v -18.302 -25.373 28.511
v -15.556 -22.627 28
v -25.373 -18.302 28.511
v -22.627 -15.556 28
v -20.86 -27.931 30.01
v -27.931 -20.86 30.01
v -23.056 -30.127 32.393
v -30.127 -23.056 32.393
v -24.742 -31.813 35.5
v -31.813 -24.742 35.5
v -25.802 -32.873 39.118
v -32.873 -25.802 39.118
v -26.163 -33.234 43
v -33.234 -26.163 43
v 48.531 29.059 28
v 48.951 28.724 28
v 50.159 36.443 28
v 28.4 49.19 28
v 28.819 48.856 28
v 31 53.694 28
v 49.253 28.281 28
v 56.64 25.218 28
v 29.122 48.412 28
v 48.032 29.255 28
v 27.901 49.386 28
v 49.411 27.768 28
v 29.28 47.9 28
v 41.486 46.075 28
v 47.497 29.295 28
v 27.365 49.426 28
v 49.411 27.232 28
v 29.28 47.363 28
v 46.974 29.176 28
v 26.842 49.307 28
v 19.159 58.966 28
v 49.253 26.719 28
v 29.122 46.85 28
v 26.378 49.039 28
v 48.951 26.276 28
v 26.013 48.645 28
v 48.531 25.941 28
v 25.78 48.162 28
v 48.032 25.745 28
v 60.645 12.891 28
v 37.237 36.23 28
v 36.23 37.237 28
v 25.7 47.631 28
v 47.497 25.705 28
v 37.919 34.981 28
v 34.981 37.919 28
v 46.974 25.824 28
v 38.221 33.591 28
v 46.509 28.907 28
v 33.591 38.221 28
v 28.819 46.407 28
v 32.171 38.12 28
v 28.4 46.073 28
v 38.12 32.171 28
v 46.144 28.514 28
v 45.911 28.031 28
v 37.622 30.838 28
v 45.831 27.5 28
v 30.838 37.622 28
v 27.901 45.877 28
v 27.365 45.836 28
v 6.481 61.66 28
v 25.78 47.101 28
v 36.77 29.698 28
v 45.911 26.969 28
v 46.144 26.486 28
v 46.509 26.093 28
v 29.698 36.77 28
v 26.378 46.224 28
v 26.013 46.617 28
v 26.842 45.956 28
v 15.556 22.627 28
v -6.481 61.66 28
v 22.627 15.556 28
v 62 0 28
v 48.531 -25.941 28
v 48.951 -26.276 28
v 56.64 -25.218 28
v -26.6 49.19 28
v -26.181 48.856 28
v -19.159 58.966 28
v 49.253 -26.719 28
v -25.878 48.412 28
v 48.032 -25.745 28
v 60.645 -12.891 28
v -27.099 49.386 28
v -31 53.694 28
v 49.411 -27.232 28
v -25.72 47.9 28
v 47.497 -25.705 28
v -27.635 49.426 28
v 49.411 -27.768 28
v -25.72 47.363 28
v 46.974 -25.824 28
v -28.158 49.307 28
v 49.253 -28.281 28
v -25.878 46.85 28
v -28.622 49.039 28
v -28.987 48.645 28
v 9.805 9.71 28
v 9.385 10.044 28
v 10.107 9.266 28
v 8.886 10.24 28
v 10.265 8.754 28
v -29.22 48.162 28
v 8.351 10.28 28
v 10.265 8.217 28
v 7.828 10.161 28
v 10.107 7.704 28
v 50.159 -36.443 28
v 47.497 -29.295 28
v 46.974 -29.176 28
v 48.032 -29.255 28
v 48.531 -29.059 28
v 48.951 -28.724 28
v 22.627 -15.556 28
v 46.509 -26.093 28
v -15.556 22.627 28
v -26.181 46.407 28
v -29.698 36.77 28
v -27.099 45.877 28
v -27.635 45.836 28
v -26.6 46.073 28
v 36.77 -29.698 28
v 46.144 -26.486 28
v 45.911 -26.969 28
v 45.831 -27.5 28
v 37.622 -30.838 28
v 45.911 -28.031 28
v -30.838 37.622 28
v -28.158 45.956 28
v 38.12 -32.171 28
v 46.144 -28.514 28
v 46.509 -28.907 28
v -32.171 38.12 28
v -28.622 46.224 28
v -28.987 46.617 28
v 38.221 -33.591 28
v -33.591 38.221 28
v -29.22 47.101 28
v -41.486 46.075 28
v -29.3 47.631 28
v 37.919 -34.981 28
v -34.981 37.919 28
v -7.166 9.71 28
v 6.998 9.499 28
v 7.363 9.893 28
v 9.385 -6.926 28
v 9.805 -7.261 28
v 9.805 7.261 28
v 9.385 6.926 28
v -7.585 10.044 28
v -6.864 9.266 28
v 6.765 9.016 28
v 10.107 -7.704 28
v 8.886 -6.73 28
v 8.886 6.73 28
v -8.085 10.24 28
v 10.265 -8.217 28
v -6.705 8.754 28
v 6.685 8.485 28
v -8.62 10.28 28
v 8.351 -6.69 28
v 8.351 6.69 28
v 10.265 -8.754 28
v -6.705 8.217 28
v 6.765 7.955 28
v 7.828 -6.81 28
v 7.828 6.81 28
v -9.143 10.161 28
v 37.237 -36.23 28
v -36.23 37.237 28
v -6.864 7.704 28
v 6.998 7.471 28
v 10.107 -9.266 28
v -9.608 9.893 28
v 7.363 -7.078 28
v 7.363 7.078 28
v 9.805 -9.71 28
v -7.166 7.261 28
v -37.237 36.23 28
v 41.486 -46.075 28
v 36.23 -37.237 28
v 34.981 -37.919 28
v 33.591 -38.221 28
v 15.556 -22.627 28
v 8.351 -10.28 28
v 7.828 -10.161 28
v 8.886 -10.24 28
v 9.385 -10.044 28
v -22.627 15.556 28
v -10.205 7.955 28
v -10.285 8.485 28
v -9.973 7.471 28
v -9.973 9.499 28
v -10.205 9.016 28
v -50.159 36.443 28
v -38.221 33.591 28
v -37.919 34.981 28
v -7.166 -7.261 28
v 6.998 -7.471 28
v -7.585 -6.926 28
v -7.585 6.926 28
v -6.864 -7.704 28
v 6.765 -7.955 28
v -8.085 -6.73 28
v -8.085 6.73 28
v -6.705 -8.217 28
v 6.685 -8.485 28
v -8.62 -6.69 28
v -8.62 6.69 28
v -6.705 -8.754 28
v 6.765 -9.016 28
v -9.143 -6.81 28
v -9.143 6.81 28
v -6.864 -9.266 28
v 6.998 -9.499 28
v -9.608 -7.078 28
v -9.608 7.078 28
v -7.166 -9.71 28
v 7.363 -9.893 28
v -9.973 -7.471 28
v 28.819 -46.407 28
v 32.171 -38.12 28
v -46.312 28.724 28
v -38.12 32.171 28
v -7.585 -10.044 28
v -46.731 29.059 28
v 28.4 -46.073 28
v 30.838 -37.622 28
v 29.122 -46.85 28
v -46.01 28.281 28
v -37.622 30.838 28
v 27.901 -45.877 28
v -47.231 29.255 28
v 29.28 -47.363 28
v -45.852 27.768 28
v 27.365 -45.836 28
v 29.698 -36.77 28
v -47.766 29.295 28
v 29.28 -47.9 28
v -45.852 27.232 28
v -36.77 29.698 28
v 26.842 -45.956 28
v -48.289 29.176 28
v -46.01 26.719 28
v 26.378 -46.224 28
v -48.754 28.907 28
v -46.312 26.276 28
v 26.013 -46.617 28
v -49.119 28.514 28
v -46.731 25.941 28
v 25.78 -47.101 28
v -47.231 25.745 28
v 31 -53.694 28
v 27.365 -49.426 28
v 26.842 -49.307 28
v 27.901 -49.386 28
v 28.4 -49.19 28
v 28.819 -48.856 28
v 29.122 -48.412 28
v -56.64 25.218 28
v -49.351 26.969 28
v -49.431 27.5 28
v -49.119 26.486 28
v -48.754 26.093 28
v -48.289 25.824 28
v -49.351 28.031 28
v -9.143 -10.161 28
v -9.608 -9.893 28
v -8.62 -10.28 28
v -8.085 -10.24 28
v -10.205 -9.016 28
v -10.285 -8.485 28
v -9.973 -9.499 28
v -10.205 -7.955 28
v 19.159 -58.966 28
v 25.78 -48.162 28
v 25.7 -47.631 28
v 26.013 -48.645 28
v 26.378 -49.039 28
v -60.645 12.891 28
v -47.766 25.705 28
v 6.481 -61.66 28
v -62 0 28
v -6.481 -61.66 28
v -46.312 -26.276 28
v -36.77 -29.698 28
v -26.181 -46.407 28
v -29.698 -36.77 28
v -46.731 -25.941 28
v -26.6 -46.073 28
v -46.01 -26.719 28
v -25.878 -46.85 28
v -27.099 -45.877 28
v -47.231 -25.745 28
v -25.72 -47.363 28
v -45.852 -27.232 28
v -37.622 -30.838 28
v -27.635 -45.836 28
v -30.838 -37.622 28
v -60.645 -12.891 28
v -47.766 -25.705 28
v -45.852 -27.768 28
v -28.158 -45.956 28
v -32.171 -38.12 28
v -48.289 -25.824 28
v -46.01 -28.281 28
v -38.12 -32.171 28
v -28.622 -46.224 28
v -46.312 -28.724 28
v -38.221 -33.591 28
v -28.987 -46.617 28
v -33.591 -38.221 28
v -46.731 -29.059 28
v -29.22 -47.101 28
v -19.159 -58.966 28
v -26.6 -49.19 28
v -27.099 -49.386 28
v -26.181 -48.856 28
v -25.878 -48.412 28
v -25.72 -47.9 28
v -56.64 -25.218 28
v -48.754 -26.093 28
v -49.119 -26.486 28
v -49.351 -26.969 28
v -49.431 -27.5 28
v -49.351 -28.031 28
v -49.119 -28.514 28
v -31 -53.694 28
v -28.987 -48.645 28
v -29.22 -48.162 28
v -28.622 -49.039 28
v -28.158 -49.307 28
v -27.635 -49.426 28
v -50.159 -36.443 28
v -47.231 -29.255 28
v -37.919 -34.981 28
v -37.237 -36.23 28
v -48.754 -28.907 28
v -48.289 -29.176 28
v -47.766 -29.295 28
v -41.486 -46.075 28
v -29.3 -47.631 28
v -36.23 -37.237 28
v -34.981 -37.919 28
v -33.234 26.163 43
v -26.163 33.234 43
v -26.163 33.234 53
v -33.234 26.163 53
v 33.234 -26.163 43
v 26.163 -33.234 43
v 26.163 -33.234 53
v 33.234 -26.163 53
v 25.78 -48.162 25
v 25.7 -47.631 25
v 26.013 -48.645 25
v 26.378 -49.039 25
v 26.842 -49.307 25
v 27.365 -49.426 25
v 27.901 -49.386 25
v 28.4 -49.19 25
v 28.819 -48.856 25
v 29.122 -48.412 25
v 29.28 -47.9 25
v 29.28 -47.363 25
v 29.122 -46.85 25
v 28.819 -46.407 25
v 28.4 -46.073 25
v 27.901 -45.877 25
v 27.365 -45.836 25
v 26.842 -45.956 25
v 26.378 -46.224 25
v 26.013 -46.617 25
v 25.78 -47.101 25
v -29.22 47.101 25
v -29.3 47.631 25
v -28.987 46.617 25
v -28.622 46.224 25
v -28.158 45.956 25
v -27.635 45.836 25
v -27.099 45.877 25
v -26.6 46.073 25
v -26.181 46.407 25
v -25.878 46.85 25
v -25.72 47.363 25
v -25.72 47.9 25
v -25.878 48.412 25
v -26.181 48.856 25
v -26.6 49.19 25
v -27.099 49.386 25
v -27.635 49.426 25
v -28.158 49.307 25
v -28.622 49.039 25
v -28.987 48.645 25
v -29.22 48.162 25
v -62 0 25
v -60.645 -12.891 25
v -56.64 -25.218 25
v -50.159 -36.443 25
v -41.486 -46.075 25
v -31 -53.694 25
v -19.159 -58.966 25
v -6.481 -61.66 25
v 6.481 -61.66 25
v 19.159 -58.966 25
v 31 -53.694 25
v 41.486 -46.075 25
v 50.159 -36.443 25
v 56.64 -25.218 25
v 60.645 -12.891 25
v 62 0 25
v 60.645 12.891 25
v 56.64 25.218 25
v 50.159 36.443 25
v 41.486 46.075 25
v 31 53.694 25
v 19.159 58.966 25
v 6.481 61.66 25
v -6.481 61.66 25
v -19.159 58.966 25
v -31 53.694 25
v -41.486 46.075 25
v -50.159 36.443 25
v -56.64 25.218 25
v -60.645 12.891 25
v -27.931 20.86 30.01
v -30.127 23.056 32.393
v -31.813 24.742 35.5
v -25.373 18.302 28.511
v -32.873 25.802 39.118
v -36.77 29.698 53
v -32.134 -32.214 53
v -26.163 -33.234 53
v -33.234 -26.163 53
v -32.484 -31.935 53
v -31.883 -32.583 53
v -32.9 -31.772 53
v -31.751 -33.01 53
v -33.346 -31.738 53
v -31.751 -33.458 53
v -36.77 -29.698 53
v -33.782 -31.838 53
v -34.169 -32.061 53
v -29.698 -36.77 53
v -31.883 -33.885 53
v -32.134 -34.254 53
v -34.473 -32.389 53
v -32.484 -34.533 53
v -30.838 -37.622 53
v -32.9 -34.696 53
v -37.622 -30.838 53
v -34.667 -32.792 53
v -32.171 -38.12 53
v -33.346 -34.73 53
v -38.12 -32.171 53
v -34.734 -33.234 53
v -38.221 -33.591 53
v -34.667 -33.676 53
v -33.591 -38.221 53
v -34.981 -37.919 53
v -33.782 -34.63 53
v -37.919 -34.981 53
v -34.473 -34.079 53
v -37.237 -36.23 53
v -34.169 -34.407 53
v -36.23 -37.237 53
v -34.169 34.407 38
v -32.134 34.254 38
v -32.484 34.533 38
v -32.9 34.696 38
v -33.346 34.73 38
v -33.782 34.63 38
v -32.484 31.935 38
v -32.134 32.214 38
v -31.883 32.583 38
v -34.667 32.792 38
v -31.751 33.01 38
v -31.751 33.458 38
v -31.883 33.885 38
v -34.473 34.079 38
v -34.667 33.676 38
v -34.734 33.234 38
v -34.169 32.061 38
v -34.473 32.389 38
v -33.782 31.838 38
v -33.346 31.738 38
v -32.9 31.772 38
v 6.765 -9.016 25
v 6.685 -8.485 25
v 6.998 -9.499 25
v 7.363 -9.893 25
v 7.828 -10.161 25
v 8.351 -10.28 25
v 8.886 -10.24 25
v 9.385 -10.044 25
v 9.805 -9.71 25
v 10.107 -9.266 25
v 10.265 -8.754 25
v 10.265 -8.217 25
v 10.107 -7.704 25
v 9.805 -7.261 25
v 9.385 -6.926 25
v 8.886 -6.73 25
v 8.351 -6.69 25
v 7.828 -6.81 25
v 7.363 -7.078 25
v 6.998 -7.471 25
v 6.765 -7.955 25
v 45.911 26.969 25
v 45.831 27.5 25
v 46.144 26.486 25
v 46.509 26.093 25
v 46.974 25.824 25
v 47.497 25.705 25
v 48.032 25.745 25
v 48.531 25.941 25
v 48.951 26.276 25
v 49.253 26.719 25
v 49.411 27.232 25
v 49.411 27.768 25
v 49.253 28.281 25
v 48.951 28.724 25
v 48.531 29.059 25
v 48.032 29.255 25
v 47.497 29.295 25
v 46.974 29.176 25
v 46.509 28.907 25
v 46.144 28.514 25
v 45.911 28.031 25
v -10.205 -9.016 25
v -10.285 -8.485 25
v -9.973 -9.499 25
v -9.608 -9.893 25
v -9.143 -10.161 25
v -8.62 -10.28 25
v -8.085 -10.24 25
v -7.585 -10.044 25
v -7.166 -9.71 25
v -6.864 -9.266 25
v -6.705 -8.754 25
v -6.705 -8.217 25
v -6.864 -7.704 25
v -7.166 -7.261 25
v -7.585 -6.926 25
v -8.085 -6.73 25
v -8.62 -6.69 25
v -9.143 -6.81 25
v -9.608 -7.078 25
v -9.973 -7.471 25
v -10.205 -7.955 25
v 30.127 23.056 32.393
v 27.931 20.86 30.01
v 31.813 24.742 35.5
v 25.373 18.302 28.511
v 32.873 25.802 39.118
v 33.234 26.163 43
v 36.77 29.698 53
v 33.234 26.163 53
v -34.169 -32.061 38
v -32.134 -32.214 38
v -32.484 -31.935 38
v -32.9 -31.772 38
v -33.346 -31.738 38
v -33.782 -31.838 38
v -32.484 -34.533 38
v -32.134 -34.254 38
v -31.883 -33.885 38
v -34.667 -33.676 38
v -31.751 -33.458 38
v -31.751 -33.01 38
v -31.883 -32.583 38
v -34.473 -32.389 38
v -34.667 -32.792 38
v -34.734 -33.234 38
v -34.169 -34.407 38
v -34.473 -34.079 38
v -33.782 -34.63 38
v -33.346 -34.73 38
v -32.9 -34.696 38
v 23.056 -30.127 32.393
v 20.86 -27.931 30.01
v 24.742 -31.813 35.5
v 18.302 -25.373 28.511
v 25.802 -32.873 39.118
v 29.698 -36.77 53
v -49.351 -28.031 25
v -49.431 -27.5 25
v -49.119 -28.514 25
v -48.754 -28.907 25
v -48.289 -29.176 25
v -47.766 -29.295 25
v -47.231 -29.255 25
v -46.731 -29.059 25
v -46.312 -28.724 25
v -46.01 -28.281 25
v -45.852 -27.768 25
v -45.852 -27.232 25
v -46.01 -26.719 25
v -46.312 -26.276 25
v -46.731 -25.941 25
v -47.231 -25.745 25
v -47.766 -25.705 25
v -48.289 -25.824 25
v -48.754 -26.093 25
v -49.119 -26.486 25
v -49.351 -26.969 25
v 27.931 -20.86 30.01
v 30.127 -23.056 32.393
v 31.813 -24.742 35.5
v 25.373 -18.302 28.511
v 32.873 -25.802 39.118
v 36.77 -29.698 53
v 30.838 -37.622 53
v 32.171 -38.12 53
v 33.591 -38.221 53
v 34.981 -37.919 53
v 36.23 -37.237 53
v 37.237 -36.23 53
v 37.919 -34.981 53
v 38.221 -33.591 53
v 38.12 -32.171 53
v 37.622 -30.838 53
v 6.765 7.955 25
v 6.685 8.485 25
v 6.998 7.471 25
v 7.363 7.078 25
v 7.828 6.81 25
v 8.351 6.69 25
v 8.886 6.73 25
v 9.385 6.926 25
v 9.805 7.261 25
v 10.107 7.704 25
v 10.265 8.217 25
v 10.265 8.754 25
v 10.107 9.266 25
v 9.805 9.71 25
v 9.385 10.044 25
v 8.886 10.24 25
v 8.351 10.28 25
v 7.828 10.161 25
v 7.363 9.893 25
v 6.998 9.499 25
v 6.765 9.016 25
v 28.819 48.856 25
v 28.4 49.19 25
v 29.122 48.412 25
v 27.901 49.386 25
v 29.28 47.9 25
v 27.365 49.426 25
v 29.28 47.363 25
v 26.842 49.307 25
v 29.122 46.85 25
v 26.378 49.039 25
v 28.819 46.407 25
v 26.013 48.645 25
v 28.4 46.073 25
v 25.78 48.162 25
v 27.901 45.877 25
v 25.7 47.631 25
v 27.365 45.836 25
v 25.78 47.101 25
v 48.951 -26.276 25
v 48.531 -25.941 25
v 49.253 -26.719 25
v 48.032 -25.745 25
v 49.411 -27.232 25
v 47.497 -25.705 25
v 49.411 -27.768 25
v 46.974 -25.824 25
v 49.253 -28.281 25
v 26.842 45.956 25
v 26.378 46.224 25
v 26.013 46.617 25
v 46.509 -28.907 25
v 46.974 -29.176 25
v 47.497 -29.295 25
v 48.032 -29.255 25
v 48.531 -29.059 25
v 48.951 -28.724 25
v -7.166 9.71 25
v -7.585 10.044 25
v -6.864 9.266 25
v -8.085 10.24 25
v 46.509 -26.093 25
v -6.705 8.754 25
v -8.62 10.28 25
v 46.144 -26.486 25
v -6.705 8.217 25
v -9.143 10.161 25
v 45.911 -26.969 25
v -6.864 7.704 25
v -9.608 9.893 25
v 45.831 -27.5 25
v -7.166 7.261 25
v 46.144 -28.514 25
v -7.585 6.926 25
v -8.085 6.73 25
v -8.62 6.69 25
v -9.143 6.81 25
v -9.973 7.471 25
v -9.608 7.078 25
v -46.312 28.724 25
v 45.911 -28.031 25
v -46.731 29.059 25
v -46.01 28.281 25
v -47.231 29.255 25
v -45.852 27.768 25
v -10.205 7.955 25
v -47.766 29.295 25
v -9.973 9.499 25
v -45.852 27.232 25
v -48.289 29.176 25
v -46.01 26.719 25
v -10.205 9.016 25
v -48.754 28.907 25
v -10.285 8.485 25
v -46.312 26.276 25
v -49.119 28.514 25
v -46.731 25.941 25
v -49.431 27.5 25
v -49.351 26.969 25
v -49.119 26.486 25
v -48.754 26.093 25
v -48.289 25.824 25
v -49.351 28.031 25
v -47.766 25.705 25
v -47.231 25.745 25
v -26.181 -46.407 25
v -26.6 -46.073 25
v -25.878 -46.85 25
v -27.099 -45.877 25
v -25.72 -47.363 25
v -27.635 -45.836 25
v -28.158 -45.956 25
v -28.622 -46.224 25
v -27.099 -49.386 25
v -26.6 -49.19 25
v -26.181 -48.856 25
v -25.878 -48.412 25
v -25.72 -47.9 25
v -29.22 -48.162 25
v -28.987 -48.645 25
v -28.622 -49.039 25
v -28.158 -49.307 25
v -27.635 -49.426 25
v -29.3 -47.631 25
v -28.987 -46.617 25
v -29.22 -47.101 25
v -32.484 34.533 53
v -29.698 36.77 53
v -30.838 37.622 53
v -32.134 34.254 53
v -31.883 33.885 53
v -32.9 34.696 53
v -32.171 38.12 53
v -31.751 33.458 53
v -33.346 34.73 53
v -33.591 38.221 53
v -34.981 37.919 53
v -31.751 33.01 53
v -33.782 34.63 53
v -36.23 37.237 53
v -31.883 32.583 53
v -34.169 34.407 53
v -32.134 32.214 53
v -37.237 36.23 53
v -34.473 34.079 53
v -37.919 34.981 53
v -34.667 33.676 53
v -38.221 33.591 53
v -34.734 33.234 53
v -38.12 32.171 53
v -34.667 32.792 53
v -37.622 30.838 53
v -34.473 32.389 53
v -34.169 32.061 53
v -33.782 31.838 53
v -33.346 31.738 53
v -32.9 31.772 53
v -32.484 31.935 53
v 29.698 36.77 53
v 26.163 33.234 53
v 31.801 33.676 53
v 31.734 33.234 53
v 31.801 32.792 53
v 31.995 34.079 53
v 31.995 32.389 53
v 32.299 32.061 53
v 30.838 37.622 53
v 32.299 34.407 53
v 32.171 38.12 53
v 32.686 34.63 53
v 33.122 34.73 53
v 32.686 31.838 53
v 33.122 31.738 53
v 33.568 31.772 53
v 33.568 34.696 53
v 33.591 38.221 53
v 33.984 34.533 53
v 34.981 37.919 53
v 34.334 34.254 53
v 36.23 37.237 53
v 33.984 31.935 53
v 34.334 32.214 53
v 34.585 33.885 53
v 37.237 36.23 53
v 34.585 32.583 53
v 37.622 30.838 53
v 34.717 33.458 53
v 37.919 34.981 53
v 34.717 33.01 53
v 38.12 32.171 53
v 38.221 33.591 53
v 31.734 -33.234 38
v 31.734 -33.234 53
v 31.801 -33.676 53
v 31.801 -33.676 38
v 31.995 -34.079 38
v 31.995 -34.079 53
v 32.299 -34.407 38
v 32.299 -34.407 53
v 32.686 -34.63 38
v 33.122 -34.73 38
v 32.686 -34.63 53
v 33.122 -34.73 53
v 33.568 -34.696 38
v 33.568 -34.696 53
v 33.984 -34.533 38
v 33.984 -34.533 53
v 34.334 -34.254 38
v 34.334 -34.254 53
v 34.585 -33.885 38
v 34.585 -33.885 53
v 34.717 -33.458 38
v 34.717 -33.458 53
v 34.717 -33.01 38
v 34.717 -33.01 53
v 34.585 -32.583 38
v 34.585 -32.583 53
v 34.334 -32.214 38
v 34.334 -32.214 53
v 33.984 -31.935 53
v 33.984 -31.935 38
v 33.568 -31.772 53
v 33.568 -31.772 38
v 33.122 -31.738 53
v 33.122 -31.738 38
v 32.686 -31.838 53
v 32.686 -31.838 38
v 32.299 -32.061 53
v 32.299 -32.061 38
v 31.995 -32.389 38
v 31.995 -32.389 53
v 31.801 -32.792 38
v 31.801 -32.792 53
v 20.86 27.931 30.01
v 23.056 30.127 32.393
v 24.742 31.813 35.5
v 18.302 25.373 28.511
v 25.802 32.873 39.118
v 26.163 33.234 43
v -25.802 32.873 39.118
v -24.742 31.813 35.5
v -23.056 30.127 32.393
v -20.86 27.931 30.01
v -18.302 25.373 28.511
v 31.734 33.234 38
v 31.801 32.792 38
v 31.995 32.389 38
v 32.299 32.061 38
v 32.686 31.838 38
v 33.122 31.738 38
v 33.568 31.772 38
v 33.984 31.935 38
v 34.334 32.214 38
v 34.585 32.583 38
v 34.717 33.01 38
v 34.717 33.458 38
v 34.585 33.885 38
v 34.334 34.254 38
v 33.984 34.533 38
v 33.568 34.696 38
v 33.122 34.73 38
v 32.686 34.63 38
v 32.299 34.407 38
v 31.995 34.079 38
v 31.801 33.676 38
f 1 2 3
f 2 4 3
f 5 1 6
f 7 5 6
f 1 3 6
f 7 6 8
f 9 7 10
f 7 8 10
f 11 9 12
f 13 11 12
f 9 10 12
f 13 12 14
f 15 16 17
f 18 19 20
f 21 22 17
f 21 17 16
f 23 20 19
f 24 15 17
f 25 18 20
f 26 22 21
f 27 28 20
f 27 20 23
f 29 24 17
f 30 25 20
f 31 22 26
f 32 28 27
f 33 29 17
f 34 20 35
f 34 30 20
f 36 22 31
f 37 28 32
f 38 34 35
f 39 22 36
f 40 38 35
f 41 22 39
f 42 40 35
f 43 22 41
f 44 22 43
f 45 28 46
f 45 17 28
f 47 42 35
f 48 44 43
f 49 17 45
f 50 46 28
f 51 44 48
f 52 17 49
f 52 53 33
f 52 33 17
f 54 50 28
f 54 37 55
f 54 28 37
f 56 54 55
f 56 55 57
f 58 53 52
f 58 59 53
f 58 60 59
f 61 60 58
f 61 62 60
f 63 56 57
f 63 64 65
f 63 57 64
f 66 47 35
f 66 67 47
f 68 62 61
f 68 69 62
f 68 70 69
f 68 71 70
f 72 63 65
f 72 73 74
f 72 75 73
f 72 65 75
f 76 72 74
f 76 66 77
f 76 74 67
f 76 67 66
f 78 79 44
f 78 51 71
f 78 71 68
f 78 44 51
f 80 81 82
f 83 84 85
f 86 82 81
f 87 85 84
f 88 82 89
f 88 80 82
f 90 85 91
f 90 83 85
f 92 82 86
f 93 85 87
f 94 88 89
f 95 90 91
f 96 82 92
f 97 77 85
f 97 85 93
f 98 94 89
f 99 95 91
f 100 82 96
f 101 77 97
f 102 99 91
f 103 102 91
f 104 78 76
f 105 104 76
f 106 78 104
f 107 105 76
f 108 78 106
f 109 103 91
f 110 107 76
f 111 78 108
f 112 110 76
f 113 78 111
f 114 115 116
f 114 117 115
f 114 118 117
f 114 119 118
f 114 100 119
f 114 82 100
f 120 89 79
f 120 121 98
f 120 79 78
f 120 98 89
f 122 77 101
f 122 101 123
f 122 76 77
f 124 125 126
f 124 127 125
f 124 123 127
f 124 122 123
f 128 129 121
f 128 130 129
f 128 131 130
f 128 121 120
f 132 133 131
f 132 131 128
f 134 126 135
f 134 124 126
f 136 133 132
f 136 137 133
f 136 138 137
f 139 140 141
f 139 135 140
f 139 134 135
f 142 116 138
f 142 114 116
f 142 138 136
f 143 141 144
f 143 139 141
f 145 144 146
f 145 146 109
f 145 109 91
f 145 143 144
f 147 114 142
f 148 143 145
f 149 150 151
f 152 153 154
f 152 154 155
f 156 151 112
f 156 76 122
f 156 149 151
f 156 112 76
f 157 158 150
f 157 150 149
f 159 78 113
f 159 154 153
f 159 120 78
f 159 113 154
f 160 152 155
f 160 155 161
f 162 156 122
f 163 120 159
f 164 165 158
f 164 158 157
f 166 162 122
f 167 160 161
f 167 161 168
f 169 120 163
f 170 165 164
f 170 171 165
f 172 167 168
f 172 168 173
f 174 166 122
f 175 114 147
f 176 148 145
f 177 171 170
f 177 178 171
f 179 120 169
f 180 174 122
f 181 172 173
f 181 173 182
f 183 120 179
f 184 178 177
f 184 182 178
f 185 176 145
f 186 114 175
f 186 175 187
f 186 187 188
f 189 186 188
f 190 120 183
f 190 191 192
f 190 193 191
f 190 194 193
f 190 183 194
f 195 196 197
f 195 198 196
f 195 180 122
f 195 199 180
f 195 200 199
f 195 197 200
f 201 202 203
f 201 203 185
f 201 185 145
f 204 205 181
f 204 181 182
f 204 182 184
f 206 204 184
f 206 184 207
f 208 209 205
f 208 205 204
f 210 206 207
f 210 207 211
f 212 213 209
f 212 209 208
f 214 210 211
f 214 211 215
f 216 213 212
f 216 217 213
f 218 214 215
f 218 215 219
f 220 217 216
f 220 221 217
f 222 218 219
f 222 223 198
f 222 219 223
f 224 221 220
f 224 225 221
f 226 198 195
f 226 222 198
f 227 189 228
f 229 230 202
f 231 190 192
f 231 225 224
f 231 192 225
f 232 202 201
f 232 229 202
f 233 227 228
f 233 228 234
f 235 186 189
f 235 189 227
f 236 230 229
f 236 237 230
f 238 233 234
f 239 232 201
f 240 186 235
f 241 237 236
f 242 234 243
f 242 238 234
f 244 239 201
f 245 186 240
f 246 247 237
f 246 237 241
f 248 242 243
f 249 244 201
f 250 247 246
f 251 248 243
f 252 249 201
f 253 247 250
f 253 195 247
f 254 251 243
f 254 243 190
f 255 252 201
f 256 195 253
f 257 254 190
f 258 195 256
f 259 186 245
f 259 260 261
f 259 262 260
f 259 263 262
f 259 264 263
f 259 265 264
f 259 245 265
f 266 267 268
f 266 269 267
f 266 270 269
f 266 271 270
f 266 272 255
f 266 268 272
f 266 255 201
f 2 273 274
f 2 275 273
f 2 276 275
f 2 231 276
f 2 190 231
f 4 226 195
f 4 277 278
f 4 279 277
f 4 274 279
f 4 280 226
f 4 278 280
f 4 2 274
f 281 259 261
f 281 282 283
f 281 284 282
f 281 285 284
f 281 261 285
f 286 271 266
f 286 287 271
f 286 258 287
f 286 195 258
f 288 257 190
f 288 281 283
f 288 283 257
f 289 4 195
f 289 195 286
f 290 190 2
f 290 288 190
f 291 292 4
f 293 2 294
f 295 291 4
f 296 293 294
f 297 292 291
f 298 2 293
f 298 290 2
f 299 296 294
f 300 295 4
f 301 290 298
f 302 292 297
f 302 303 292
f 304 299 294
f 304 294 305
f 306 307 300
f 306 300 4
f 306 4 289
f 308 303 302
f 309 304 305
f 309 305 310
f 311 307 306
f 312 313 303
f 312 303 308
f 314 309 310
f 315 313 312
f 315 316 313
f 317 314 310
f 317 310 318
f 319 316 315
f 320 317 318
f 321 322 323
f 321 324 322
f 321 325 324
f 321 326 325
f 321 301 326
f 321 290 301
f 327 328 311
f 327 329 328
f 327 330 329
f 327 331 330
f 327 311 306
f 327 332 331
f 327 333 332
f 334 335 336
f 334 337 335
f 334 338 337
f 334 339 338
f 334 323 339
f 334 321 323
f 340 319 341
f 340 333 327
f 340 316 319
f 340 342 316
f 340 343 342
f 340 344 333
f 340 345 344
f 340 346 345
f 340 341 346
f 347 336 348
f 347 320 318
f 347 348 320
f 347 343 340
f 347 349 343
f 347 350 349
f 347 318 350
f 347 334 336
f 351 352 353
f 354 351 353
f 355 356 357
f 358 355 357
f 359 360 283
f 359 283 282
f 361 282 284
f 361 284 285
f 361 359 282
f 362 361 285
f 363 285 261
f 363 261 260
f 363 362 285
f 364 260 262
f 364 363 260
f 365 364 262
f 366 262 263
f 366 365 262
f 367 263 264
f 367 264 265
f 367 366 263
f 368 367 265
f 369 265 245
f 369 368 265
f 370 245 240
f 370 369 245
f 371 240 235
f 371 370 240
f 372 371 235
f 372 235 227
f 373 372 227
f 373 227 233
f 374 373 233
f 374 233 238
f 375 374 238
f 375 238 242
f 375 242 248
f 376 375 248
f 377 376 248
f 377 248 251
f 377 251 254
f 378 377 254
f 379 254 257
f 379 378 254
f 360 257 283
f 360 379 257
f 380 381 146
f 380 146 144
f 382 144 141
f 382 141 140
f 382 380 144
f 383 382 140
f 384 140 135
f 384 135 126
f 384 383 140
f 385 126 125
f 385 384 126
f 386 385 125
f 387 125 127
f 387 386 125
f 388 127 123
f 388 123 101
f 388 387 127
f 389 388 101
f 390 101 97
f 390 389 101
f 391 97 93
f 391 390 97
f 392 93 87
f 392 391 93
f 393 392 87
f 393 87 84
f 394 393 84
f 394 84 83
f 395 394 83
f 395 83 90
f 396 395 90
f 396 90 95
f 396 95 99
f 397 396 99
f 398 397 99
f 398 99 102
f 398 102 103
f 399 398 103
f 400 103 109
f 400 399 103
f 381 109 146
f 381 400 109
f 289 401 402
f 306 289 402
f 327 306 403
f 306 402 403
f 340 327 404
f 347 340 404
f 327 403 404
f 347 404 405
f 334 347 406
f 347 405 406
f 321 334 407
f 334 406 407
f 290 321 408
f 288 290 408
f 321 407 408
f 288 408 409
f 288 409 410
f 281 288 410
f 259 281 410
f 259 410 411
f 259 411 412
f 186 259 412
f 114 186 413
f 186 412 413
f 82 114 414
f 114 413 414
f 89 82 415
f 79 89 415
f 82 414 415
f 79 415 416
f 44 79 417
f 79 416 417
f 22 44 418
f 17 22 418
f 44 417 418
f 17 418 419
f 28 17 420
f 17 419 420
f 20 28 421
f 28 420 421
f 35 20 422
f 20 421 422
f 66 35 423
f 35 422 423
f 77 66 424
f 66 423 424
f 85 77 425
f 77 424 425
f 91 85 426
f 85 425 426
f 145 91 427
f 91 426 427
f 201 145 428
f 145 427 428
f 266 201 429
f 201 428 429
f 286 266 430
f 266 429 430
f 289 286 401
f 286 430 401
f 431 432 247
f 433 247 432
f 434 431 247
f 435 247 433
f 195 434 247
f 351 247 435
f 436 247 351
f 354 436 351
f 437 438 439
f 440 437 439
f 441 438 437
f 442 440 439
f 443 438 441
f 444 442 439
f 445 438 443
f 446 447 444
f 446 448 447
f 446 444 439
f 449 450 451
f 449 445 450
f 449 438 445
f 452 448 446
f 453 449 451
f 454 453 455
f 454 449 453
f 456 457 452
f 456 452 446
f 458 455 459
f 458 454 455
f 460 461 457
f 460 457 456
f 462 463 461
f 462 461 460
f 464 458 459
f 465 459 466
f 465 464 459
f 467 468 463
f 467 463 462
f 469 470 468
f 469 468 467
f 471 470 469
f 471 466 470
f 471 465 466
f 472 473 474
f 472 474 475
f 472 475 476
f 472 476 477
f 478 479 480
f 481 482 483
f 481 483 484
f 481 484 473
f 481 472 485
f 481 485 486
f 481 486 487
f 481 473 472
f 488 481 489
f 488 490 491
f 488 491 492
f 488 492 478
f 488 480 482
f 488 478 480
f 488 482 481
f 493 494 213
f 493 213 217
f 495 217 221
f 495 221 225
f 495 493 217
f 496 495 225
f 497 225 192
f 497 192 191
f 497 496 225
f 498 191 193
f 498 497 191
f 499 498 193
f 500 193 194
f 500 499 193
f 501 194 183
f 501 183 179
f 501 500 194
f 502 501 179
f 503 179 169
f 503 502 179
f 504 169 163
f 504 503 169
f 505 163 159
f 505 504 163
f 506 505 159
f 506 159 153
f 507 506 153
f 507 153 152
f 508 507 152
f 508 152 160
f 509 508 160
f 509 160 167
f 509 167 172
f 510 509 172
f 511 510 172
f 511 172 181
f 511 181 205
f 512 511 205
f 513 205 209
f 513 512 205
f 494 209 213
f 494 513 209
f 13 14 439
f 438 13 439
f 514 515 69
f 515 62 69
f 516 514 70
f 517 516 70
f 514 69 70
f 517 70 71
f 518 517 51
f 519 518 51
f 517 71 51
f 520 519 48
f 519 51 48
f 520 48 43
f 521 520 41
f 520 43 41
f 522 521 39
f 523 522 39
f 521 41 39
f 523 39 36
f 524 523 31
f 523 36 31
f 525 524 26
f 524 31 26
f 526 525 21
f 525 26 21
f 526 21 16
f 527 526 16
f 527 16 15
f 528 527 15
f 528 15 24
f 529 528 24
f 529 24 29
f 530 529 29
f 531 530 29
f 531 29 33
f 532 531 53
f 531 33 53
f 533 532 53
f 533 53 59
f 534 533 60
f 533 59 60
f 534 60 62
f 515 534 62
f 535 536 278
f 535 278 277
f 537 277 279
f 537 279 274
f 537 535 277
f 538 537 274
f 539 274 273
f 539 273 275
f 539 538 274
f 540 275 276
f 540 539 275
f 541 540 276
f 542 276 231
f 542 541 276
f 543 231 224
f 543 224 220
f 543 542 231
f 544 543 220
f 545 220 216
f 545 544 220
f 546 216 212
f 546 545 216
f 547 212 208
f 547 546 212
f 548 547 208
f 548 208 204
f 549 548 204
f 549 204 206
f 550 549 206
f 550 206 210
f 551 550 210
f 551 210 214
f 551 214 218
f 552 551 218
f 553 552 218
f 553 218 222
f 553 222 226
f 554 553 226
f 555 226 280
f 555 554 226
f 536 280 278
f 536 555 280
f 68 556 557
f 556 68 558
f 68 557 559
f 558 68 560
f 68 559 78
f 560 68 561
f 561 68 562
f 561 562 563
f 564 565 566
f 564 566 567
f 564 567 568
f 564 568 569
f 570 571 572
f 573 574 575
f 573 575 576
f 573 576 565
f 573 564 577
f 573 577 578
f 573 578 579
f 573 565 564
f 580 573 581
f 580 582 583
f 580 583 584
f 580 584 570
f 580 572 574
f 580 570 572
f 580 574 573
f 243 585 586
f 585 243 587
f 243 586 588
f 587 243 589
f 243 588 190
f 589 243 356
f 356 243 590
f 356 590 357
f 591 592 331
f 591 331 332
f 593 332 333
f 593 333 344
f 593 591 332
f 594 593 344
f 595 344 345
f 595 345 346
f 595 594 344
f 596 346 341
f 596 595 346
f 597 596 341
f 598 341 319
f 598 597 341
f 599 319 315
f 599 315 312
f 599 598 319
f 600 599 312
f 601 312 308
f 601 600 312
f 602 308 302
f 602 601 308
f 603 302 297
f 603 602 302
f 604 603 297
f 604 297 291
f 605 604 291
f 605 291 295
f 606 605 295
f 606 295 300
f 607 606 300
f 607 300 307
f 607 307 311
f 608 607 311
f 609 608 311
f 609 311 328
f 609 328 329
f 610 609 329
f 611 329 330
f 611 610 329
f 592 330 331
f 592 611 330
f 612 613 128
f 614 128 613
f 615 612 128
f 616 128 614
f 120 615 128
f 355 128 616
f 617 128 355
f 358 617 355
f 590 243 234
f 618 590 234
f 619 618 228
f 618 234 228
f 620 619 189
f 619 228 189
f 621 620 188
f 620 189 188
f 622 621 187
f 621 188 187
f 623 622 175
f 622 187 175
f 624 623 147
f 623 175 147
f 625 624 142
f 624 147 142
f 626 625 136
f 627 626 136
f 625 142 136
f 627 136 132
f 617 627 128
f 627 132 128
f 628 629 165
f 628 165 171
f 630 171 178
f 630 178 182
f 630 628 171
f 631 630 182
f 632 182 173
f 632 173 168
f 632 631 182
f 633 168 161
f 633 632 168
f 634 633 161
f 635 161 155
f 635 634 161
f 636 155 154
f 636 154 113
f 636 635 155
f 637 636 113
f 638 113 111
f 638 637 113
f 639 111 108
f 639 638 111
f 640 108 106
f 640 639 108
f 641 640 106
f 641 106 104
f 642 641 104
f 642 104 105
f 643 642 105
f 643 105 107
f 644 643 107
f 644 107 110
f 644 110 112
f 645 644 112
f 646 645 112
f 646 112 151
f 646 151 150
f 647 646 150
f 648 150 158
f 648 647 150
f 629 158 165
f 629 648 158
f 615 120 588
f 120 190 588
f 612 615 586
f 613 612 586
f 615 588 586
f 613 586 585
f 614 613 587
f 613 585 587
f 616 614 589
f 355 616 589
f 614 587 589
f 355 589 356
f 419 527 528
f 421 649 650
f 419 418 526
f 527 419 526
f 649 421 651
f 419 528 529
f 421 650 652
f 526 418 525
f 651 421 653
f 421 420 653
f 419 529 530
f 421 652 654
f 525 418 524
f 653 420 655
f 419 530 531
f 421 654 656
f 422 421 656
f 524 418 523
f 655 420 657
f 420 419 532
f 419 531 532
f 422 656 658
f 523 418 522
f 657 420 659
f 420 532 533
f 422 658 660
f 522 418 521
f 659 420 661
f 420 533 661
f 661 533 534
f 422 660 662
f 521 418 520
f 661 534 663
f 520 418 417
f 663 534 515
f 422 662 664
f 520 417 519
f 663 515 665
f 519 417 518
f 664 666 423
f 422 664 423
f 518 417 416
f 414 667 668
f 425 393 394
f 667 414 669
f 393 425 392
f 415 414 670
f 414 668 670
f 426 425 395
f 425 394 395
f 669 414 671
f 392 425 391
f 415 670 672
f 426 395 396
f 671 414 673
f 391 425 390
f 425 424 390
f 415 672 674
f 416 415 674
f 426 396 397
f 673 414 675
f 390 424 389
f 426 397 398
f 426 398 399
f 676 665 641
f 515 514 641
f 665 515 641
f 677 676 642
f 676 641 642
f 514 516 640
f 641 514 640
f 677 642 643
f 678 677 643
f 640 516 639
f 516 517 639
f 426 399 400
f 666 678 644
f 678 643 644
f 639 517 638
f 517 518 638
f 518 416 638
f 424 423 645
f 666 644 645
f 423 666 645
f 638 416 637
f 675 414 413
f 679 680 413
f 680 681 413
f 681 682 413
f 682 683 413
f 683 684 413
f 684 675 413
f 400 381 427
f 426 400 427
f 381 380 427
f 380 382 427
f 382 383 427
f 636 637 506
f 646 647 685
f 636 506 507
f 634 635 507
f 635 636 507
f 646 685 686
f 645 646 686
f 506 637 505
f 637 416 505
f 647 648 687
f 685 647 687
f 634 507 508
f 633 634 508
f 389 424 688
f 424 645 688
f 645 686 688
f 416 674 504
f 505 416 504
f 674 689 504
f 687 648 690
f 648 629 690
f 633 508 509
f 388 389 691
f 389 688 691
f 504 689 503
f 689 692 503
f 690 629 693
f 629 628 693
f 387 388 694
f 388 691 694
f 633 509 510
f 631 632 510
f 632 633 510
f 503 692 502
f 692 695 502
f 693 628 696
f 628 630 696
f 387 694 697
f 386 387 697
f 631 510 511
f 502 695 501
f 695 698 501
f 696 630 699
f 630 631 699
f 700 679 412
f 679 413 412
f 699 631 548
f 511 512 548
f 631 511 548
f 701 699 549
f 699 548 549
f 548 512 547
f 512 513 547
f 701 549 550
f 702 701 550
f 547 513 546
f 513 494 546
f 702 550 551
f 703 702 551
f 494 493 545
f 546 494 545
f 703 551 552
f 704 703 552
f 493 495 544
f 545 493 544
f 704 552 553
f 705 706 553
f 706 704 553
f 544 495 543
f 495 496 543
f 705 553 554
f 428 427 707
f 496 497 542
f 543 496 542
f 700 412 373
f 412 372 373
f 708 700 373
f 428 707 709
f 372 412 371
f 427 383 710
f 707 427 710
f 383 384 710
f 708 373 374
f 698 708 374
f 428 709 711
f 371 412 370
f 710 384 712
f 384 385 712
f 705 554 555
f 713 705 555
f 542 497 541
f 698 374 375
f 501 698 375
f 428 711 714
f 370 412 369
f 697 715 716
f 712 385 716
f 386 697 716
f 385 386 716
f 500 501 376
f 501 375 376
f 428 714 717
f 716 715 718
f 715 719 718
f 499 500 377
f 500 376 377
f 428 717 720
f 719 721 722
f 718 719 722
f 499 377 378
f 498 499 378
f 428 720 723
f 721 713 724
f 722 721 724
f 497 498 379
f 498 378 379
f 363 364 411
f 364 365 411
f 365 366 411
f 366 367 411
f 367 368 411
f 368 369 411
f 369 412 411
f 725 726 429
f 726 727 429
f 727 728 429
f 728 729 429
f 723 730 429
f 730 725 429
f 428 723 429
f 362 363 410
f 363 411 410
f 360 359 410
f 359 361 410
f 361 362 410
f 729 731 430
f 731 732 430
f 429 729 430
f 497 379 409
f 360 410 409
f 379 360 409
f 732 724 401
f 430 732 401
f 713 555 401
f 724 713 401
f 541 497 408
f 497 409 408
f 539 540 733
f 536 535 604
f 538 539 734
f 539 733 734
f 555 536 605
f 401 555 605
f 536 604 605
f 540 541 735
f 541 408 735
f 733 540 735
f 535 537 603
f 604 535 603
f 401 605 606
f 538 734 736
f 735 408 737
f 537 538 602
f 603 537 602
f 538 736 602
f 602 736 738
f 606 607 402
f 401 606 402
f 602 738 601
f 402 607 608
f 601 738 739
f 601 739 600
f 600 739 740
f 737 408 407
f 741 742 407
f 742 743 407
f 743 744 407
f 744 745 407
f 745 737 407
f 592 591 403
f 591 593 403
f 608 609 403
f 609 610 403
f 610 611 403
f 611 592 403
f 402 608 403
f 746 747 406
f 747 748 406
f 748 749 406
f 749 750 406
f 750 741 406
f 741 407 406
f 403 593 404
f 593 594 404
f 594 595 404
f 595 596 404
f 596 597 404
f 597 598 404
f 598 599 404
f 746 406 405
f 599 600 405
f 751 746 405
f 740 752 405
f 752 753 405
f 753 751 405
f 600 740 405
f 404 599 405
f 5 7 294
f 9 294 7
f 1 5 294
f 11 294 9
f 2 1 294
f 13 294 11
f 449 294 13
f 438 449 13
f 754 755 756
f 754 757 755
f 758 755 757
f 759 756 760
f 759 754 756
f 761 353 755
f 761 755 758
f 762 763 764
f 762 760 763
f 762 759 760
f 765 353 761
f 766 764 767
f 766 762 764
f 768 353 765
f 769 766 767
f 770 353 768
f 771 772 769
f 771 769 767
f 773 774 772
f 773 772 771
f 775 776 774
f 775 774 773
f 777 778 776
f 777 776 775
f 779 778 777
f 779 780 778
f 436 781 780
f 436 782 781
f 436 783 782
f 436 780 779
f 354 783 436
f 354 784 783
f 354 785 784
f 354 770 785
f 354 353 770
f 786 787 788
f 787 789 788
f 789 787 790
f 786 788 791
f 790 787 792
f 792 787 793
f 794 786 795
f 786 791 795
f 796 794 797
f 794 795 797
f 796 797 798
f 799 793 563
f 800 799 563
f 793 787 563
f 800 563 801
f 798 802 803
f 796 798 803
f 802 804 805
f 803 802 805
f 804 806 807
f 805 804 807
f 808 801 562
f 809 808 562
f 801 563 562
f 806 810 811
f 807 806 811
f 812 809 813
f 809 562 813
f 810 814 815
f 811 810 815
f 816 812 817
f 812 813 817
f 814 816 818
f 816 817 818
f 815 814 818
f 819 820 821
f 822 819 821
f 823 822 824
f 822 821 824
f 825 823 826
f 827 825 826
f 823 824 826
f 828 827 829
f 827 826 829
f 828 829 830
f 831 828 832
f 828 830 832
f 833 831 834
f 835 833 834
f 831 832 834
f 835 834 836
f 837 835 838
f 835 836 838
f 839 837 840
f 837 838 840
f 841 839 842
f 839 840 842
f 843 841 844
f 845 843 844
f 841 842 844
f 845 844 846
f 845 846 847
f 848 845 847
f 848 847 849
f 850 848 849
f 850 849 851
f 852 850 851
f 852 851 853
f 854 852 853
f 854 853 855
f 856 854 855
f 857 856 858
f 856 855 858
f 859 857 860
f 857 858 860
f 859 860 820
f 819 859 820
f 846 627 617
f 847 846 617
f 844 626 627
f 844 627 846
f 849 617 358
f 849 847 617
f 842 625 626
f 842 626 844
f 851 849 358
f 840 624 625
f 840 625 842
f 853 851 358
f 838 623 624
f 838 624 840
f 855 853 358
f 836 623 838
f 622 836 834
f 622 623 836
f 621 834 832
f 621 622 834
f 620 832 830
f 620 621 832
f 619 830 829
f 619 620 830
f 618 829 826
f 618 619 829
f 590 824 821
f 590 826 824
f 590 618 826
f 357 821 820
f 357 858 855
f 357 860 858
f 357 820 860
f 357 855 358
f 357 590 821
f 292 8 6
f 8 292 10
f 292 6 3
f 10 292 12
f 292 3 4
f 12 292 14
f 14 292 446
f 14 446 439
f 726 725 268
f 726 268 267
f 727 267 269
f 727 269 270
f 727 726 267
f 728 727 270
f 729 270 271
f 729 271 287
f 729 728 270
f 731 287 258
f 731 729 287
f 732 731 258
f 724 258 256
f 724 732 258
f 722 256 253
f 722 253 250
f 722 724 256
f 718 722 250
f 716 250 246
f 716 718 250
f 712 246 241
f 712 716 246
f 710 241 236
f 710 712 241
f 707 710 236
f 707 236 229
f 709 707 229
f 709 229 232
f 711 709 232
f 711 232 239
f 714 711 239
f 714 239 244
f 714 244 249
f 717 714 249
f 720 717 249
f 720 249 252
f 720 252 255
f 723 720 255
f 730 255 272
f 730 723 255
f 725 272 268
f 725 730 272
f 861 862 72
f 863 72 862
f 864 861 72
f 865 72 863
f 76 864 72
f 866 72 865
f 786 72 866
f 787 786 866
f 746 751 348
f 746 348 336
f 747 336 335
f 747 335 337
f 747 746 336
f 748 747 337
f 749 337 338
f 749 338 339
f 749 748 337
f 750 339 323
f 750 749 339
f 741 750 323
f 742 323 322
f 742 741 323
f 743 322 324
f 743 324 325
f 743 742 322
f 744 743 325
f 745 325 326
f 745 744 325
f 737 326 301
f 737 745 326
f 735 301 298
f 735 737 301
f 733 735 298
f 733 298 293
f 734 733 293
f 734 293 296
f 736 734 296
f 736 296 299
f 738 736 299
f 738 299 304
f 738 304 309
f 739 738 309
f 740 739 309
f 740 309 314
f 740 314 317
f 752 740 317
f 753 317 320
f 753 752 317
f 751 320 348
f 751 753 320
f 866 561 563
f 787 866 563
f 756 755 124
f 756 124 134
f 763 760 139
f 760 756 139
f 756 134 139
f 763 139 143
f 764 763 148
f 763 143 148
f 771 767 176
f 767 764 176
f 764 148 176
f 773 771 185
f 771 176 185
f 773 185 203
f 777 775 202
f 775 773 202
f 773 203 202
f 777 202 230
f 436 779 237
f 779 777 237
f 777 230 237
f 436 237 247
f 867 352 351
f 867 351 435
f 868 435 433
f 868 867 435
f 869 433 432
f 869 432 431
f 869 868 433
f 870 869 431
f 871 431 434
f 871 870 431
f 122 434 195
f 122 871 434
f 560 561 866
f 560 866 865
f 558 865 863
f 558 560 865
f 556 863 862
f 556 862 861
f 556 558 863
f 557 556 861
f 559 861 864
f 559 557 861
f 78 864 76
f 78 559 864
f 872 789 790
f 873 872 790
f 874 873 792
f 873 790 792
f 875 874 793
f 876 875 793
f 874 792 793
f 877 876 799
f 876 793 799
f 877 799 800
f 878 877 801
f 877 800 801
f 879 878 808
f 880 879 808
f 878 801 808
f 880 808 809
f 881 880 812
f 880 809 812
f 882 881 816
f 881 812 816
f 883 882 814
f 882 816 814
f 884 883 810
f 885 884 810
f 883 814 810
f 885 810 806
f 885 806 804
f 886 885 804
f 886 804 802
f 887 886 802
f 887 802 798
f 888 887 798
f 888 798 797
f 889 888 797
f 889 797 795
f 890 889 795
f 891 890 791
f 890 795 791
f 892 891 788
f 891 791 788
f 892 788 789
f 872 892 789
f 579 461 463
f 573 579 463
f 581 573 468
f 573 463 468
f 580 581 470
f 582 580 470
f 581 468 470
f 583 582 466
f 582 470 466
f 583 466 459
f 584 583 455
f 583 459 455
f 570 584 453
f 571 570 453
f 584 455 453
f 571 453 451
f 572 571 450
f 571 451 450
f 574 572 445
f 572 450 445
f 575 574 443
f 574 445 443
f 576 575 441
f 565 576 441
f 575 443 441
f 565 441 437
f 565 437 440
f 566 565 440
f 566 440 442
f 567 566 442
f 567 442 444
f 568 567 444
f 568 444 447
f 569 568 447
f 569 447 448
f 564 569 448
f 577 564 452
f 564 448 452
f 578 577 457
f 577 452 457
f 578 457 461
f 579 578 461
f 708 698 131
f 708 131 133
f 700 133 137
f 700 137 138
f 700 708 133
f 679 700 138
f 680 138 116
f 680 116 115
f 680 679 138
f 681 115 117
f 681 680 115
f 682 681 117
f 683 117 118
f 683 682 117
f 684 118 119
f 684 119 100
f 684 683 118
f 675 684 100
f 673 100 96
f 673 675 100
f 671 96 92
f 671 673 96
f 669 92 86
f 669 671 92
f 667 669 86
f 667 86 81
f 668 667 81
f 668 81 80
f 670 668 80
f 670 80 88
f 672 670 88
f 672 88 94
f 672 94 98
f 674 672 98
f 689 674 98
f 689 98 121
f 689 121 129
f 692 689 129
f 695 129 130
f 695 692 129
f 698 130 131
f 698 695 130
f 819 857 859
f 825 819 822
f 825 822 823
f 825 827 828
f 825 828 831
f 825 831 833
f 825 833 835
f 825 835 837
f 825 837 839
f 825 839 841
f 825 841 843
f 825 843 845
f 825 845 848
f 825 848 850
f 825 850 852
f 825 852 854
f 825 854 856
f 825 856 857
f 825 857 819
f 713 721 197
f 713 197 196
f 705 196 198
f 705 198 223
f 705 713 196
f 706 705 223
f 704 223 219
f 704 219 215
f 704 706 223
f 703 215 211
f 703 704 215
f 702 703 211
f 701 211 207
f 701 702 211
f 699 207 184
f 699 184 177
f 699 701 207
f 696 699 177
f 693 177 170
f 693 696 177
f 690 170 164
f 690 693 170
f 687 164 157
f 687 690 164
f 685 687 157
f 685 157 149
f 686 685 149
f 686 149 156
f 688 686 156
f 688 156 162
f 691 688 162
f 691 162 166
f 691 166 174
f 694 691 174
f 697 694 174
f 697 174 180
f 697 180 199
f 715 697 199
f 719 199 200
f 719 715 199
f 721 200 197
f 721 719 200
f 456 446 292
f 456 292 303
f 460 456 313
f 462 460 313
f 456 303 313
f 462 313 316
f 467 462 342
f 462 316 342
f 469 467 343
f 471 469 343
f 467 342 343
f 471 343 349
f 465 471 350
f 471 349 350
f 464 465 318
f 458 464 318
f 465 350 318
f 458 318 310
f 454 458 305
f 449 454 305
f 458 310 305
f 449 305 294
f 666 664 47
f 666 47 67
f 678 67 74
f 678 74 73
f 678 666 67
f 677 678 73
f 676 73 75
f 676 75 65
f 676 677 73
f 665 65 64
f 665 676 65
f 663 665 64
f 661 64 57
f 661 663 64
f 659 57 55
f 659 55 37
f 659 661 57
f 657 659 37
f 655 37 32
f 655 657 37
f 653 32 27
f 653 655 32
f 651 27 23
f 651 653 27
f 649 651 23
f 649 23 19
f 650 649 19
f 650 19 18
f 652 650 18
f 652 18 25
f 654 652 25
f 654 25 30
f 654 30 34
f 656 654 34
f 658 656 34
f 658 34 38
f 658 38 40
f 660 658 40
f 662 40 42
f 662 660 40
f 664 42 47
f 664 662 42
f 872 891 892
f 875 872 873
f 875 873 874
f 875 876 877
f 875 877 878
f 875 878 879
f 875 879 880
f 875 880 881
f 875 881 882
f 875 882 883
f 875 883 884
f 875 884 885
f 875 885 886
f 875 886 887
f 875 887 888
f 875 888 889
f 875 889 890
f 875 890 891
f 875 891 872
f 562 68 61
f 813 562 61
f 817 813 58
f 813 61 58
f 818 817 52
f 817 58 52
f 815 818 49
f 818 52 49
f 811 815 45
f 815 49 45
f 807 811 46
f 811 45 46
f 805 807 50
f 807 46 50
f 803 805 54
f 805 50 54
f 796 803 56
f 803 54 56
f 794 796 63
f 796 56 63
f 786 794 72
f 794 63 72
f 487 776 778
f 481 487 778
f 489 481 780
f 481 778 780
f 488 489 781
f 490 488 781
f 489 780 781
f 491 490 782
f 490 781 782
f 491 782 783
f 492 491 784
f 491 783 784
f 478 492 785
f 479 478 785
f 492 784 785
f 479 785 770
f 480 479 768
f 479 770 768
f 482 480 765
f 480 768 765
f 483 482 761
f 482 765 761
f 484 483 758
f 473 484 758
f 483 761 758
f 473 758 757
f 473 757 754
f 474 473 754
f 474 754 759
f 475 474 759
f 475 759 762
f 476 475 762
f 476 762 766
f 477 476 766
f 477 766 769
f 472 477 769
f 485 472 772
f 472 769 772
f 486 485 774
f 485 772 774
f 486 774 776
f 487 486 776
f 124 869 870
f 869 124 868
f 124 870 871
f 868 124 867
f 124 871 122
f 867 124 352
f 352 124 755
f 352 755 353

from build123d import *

# Parameters (mm, degrees)
SKETCH003_R             = 62
SKETCH003_R_2           = 1.8
PAD002_DEPTH            = 3
SKETCH005_R             = 5
PAD004_DEPTH            = 28
SKETCH011_R             = 1.8
POCKET004_DEPTH         = 3
PAD011_DEPTH            = 5
PAD012_DEPTH            = 5
SKETCH007_R             = 1.5
POCKET002_DEPTH         = 15
BODY001_PLACEMENT_ANGLE = 180


with BuildPart() as part:
    # Sketch003 → Pad002 (new body)
    with BuildSketch(Plane.XY):
        Circle(SKETCH003_R)
        with Locations((8.485281, 8.485281)):
            Circle(SKETCH003_R_2, mode=Mode.SUBTRACT)
        with Locations((-8.485281, 8.485281)):
            Circle(SKETCH003_R_2, mode=Mode.SUBTRACT)
        with Locations((-8.485281, -8.485281)):
            Circle(SKETCH003_R_2, mode=Mode.SUBTRACT)
        with Locations((8.485281, -8.485281)):
            Circle(SKETCH003_R_2, mode=Mode.SUBTRACT)
    extrude(amount=PAD002_DEPTH)

    # Sketch005 → Pad004 (join)
    with BuildSketch(Plane.XY):
        with Locations((33.234019, 33.234019)):
            Circle(SKETCH005_R)
        with Locations((-33.234019, 33.234019)):
            Circle(SKETCH005_R)
        with Locations((-33.234019, -33.234019)):
            Circle(SKETCH005_R)
        with Locations((33.234019, -33.234019)):
            Circle(SKETCH005_R)
    extrude(amount=PAD004_DEPTH)

    # Sketch011 → Pocket004 (cut, symmetric)
    with BuildSketch(Plane.XY):
        with Locations((27.5, 47.631397)):
            Circle(SKETCH011_R)
        with Locations((-47.631397, 27.5)):
            Circle(SKETCH011_R)
        with Locations((-27.5, -47.631397)):
            Circle(SKETCH011_R)
        with Locations((47.631397, -27.5)):
            Circle(SKETCH011_R)
        with Locations((-27.5, 47.631397)):
            Circle(SKETCH011_R)
        with Locations((47.631397, 27.5)):
            Circle(SKETCH011_R)
        with Locations((27.5, -47.631397)):
            Circle(SKETCH011_R)
        with Locations((-47.631397, -27.5)):
            Circle(SKETCH011_R)
    extrude(amount=POCKET004_DEPTH, both=True, mode=Mode.SUBTRACT)

    # Sketch018 → Pad011 (join, symmetric)
    with BuildSketch(Plane(origin=(0, 0, 0), x_dir=(-0.707107, 0.707107, 0), z_dir=(0.707107, 0.707107, 0))):
        with BuildLine():
            Line((-47, 28), (-47, 3))
            Line((-47, 3), (-27, 3))
            ThreePointArc((-42, 18), (-37.606602, 7.393398), (-27, 3))
            Line((-42, 18), (-42, 28))
            Line((-42, 28), (-47, 28))
        make_face()
        with BuildLine():
            Line((47, 28), (47, 3))
            Line((47, 3), (27, 3))
            ThreePointArc((27, 3), (37.606602, 7.393398), (42, 18))
            Line((42, 18), (42, 28))
            Line((42, 28), (47, 28))
        make_face()
    extrude(amount=PAD011_DEPTH, both=True)

    # Sketch019 → Pad012 (join, symmetric)
    with BuildSketch(Plane(origin=(0, 0, 0), x_dir=(0.707107, 0.707107, 0), z_dir=(0.707107, -0.707107, 0))):
        with BuildLine():
            Line((-47, 28), (-47, 3))
            Line((-47, 3), (-27, 3))
            ThreePointArc((-42, 18), (-37.606602, 7.393398), (-27, 3))
            Line((-42, 18), (-42, 28))
            Line((-42, 28), (-47, 28))
        make_face()
        with BuildLine():
            Line((47, 28), (47, 3))
            Line((47, 3), (27, 3))
            ThreePointArc((27, 3), (37.606602, 7.393398), (42, 18))
            Line((42, 18), (42, 28))
            Line((42, 28), (47, 28))
        make_face()
    extrude(amount=PAD012_DEPTH, both=True)

    # Sketch007 → Pocket002 (cut)
    with BuildSketch(Plane.XY.offset(28)):
        with Locations((33.234019, 33.234019)):
            Circle(SKETCH007_R)
        with Locations((-33.234019, 33.234019)):
            Circle(SKETCH007_R)
        with Locations((-33.234019, -33.234019)):
            Circle(SKETCH007_R)
        with Locations((33.234019, -33.234019)):
            Circle(SKETCH007_R)
    extrude(amount=-POCKET002_DEPTH, mode=Mode.SUBTRACT)


with BuildPart() as part_1:
    # Body001 placement: moved
    add(part.part.moved(Location((0, 0, 25))).rotate(Axis((0, 0, 25), (0, 0, -1)), BODY001_PLACEMENT_ANGLE))


solid = part_1.part
